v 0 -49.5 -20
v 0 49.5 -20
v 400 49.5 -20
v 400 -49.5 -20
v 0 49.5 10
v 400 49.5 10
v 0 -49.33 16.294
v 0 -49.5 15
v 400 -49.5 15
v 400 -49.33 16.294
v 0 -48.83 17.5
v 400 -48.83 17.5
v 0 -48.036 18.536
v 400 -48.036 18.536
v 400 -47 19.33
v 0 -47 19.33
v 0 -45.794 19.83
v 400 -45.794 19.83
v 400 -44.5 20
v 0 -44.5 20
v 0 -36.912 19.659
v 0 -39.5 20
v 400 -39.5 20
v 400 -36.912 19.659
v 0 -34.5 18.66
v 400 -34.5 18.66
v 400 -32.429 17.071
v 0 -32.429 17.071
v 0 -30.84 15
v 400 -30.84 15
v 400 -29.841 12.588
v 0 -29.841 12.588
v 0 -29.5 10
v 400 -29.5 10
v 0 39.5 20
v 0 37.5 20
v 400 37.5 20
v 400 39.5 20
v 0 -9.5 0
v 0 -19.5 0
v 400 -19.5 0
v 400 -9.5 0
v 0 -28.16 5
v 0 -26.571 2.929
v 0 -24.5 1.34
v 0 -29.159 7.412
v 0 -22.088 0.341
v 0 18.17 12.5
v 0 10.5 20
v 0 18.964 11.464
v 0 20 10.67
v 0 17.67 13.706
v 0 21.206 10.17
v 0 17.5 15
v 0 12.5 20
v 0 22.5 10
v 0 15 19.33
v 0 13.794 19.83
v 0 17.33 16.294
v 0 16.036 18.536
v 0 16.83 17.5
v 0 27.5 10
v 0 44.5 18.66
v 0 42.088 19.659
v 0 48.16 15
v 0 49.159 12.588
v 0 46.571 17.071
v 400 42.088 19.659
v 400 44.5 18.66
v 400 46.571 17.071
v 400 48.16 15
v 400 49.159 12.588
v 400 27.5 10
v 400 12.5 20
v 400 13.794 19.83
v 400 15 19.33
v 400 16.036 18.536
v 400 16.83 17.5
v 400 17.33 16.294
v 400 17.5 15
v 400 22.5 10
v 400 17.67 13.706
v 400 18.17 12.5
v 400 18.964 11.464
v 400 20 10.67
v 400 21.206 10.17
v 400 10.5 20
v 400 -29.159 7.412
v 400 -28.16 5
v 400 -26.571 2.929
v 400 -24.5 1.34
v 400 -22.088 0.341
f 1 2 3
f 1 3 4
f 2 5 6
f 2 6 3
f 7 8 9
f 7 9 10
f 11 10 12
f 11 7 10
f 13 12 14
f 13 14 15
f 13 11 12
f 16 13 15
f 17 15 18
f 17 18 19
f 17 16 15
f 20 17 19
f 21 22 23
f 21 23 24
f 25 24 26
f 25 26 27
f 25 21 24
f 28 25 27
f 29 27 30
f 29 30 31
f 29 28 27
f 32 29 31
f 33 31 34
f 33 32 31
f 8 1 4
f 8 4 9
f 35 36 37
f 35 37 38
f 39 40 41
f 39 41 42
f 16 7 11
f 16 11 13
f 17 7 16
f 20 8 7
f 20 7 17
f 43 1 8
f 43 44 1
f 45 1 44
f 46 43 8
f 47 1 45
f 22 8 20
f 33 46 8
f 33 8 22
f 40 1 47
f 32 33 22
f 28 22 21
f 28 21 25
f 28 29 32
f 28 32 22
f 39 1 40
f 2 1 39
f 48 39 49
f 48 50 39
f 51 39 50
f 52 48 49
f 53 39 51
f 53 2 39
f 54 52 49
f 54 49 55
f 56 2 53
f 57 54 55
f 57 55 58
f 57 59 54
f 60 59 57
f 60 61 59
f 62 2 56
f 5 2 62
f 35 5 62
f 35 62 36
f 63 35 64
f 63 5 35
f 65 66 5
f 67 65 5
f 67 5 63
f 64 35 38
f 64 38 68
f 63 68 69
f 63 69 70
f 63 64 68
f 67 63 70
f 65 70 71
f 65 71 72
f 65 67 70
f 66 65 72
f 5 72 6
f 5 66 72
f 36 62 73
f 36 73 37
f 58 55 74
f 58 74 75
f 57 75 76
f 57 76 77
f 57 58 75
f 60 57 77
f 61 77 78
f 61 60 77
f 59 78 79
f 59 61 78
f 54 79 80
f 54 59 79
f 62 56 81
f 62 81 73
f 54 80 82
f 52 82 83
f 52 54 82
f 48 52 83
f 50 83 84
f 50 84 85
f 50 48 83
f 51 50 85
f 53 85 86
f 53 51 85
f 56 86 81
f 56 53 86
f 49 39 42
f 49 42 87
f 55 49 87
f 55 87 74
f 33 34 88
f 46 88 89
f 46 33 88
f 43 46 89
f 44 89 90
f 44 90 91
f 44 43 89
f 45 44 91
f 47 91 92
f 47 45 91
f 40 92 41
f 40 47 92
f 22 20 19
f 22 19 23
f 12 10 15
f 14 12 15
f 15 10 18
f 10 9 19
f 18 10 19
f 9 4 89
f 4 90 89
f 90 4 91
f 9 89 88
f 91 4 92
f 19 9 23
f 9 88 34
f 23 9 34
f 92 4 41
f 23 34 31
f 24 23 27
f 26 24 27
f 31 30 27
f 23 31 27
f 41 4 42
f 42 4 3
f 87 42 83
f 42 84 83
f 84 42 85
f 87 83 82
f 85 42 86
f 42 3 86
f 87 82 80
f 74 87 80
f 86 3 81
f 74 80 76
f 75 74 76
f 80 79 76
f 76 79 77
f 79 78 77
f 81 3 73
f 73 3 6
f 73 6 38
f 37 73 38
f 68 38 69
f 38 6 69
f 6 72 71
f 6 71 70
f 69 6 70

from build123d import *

# Parameters (mm, degrees)
SALIENTE_EXTRUIR1_DEPTH = 400


with BuildPart() as part:
    # Croquis1 → Saliente-Extruir1 (new body)
    with BuildSketch(Plane(origin=(0, 0, 0), x_dir=(0, 0, -1), z_dir=(1, 0, 0))):
        with BuildLine():
            Line((-20, 37.5), (-20, 39.5))
            ThreePointArc((-20, 39.5), (-17.071067812, 46.571067812), (-10, 49.5))
            Line((-10, 49.5), (20, 49.5))
            Line((20, 49.5), (20, -49.5))
            Line((20, -49.5), (-15, -49.5))
            ThreePointArc((-15, -49.5), (-18.535533906, -48.035533906), (-20, -44.5))
            Line((-20, -44.5), (-20, -39.5))
            ThreePointArc((-20, -39.5), (-17.071067812, -32.428932188), (-10, -29.5))
            ThreePointArc((-10, -29.5), (-2.928932188, -26.571067812), (0, -19.5))
            Line((0, -19.5), (0, -9.5))
            Line((0, -9.5), (-20, 10.5))
            Line((-20, 10.5), (-20, 12.5))
            ThreePointArc((-20, 12.5), (-18.535533906, 16.035533906), (-15, 17.5))
            ThreePointArc((-15, 17.5), (-11.464466094, 18.964466094), (-10, 22.5))
            Line((-10, 22.5), (-10, 27.5))
            Line((-10, 27.5), (-20, 37.5))
        make_face()
    extrude(amount=SALIENTE_EXTRUIR1_DEPTH)


solid = part.part
